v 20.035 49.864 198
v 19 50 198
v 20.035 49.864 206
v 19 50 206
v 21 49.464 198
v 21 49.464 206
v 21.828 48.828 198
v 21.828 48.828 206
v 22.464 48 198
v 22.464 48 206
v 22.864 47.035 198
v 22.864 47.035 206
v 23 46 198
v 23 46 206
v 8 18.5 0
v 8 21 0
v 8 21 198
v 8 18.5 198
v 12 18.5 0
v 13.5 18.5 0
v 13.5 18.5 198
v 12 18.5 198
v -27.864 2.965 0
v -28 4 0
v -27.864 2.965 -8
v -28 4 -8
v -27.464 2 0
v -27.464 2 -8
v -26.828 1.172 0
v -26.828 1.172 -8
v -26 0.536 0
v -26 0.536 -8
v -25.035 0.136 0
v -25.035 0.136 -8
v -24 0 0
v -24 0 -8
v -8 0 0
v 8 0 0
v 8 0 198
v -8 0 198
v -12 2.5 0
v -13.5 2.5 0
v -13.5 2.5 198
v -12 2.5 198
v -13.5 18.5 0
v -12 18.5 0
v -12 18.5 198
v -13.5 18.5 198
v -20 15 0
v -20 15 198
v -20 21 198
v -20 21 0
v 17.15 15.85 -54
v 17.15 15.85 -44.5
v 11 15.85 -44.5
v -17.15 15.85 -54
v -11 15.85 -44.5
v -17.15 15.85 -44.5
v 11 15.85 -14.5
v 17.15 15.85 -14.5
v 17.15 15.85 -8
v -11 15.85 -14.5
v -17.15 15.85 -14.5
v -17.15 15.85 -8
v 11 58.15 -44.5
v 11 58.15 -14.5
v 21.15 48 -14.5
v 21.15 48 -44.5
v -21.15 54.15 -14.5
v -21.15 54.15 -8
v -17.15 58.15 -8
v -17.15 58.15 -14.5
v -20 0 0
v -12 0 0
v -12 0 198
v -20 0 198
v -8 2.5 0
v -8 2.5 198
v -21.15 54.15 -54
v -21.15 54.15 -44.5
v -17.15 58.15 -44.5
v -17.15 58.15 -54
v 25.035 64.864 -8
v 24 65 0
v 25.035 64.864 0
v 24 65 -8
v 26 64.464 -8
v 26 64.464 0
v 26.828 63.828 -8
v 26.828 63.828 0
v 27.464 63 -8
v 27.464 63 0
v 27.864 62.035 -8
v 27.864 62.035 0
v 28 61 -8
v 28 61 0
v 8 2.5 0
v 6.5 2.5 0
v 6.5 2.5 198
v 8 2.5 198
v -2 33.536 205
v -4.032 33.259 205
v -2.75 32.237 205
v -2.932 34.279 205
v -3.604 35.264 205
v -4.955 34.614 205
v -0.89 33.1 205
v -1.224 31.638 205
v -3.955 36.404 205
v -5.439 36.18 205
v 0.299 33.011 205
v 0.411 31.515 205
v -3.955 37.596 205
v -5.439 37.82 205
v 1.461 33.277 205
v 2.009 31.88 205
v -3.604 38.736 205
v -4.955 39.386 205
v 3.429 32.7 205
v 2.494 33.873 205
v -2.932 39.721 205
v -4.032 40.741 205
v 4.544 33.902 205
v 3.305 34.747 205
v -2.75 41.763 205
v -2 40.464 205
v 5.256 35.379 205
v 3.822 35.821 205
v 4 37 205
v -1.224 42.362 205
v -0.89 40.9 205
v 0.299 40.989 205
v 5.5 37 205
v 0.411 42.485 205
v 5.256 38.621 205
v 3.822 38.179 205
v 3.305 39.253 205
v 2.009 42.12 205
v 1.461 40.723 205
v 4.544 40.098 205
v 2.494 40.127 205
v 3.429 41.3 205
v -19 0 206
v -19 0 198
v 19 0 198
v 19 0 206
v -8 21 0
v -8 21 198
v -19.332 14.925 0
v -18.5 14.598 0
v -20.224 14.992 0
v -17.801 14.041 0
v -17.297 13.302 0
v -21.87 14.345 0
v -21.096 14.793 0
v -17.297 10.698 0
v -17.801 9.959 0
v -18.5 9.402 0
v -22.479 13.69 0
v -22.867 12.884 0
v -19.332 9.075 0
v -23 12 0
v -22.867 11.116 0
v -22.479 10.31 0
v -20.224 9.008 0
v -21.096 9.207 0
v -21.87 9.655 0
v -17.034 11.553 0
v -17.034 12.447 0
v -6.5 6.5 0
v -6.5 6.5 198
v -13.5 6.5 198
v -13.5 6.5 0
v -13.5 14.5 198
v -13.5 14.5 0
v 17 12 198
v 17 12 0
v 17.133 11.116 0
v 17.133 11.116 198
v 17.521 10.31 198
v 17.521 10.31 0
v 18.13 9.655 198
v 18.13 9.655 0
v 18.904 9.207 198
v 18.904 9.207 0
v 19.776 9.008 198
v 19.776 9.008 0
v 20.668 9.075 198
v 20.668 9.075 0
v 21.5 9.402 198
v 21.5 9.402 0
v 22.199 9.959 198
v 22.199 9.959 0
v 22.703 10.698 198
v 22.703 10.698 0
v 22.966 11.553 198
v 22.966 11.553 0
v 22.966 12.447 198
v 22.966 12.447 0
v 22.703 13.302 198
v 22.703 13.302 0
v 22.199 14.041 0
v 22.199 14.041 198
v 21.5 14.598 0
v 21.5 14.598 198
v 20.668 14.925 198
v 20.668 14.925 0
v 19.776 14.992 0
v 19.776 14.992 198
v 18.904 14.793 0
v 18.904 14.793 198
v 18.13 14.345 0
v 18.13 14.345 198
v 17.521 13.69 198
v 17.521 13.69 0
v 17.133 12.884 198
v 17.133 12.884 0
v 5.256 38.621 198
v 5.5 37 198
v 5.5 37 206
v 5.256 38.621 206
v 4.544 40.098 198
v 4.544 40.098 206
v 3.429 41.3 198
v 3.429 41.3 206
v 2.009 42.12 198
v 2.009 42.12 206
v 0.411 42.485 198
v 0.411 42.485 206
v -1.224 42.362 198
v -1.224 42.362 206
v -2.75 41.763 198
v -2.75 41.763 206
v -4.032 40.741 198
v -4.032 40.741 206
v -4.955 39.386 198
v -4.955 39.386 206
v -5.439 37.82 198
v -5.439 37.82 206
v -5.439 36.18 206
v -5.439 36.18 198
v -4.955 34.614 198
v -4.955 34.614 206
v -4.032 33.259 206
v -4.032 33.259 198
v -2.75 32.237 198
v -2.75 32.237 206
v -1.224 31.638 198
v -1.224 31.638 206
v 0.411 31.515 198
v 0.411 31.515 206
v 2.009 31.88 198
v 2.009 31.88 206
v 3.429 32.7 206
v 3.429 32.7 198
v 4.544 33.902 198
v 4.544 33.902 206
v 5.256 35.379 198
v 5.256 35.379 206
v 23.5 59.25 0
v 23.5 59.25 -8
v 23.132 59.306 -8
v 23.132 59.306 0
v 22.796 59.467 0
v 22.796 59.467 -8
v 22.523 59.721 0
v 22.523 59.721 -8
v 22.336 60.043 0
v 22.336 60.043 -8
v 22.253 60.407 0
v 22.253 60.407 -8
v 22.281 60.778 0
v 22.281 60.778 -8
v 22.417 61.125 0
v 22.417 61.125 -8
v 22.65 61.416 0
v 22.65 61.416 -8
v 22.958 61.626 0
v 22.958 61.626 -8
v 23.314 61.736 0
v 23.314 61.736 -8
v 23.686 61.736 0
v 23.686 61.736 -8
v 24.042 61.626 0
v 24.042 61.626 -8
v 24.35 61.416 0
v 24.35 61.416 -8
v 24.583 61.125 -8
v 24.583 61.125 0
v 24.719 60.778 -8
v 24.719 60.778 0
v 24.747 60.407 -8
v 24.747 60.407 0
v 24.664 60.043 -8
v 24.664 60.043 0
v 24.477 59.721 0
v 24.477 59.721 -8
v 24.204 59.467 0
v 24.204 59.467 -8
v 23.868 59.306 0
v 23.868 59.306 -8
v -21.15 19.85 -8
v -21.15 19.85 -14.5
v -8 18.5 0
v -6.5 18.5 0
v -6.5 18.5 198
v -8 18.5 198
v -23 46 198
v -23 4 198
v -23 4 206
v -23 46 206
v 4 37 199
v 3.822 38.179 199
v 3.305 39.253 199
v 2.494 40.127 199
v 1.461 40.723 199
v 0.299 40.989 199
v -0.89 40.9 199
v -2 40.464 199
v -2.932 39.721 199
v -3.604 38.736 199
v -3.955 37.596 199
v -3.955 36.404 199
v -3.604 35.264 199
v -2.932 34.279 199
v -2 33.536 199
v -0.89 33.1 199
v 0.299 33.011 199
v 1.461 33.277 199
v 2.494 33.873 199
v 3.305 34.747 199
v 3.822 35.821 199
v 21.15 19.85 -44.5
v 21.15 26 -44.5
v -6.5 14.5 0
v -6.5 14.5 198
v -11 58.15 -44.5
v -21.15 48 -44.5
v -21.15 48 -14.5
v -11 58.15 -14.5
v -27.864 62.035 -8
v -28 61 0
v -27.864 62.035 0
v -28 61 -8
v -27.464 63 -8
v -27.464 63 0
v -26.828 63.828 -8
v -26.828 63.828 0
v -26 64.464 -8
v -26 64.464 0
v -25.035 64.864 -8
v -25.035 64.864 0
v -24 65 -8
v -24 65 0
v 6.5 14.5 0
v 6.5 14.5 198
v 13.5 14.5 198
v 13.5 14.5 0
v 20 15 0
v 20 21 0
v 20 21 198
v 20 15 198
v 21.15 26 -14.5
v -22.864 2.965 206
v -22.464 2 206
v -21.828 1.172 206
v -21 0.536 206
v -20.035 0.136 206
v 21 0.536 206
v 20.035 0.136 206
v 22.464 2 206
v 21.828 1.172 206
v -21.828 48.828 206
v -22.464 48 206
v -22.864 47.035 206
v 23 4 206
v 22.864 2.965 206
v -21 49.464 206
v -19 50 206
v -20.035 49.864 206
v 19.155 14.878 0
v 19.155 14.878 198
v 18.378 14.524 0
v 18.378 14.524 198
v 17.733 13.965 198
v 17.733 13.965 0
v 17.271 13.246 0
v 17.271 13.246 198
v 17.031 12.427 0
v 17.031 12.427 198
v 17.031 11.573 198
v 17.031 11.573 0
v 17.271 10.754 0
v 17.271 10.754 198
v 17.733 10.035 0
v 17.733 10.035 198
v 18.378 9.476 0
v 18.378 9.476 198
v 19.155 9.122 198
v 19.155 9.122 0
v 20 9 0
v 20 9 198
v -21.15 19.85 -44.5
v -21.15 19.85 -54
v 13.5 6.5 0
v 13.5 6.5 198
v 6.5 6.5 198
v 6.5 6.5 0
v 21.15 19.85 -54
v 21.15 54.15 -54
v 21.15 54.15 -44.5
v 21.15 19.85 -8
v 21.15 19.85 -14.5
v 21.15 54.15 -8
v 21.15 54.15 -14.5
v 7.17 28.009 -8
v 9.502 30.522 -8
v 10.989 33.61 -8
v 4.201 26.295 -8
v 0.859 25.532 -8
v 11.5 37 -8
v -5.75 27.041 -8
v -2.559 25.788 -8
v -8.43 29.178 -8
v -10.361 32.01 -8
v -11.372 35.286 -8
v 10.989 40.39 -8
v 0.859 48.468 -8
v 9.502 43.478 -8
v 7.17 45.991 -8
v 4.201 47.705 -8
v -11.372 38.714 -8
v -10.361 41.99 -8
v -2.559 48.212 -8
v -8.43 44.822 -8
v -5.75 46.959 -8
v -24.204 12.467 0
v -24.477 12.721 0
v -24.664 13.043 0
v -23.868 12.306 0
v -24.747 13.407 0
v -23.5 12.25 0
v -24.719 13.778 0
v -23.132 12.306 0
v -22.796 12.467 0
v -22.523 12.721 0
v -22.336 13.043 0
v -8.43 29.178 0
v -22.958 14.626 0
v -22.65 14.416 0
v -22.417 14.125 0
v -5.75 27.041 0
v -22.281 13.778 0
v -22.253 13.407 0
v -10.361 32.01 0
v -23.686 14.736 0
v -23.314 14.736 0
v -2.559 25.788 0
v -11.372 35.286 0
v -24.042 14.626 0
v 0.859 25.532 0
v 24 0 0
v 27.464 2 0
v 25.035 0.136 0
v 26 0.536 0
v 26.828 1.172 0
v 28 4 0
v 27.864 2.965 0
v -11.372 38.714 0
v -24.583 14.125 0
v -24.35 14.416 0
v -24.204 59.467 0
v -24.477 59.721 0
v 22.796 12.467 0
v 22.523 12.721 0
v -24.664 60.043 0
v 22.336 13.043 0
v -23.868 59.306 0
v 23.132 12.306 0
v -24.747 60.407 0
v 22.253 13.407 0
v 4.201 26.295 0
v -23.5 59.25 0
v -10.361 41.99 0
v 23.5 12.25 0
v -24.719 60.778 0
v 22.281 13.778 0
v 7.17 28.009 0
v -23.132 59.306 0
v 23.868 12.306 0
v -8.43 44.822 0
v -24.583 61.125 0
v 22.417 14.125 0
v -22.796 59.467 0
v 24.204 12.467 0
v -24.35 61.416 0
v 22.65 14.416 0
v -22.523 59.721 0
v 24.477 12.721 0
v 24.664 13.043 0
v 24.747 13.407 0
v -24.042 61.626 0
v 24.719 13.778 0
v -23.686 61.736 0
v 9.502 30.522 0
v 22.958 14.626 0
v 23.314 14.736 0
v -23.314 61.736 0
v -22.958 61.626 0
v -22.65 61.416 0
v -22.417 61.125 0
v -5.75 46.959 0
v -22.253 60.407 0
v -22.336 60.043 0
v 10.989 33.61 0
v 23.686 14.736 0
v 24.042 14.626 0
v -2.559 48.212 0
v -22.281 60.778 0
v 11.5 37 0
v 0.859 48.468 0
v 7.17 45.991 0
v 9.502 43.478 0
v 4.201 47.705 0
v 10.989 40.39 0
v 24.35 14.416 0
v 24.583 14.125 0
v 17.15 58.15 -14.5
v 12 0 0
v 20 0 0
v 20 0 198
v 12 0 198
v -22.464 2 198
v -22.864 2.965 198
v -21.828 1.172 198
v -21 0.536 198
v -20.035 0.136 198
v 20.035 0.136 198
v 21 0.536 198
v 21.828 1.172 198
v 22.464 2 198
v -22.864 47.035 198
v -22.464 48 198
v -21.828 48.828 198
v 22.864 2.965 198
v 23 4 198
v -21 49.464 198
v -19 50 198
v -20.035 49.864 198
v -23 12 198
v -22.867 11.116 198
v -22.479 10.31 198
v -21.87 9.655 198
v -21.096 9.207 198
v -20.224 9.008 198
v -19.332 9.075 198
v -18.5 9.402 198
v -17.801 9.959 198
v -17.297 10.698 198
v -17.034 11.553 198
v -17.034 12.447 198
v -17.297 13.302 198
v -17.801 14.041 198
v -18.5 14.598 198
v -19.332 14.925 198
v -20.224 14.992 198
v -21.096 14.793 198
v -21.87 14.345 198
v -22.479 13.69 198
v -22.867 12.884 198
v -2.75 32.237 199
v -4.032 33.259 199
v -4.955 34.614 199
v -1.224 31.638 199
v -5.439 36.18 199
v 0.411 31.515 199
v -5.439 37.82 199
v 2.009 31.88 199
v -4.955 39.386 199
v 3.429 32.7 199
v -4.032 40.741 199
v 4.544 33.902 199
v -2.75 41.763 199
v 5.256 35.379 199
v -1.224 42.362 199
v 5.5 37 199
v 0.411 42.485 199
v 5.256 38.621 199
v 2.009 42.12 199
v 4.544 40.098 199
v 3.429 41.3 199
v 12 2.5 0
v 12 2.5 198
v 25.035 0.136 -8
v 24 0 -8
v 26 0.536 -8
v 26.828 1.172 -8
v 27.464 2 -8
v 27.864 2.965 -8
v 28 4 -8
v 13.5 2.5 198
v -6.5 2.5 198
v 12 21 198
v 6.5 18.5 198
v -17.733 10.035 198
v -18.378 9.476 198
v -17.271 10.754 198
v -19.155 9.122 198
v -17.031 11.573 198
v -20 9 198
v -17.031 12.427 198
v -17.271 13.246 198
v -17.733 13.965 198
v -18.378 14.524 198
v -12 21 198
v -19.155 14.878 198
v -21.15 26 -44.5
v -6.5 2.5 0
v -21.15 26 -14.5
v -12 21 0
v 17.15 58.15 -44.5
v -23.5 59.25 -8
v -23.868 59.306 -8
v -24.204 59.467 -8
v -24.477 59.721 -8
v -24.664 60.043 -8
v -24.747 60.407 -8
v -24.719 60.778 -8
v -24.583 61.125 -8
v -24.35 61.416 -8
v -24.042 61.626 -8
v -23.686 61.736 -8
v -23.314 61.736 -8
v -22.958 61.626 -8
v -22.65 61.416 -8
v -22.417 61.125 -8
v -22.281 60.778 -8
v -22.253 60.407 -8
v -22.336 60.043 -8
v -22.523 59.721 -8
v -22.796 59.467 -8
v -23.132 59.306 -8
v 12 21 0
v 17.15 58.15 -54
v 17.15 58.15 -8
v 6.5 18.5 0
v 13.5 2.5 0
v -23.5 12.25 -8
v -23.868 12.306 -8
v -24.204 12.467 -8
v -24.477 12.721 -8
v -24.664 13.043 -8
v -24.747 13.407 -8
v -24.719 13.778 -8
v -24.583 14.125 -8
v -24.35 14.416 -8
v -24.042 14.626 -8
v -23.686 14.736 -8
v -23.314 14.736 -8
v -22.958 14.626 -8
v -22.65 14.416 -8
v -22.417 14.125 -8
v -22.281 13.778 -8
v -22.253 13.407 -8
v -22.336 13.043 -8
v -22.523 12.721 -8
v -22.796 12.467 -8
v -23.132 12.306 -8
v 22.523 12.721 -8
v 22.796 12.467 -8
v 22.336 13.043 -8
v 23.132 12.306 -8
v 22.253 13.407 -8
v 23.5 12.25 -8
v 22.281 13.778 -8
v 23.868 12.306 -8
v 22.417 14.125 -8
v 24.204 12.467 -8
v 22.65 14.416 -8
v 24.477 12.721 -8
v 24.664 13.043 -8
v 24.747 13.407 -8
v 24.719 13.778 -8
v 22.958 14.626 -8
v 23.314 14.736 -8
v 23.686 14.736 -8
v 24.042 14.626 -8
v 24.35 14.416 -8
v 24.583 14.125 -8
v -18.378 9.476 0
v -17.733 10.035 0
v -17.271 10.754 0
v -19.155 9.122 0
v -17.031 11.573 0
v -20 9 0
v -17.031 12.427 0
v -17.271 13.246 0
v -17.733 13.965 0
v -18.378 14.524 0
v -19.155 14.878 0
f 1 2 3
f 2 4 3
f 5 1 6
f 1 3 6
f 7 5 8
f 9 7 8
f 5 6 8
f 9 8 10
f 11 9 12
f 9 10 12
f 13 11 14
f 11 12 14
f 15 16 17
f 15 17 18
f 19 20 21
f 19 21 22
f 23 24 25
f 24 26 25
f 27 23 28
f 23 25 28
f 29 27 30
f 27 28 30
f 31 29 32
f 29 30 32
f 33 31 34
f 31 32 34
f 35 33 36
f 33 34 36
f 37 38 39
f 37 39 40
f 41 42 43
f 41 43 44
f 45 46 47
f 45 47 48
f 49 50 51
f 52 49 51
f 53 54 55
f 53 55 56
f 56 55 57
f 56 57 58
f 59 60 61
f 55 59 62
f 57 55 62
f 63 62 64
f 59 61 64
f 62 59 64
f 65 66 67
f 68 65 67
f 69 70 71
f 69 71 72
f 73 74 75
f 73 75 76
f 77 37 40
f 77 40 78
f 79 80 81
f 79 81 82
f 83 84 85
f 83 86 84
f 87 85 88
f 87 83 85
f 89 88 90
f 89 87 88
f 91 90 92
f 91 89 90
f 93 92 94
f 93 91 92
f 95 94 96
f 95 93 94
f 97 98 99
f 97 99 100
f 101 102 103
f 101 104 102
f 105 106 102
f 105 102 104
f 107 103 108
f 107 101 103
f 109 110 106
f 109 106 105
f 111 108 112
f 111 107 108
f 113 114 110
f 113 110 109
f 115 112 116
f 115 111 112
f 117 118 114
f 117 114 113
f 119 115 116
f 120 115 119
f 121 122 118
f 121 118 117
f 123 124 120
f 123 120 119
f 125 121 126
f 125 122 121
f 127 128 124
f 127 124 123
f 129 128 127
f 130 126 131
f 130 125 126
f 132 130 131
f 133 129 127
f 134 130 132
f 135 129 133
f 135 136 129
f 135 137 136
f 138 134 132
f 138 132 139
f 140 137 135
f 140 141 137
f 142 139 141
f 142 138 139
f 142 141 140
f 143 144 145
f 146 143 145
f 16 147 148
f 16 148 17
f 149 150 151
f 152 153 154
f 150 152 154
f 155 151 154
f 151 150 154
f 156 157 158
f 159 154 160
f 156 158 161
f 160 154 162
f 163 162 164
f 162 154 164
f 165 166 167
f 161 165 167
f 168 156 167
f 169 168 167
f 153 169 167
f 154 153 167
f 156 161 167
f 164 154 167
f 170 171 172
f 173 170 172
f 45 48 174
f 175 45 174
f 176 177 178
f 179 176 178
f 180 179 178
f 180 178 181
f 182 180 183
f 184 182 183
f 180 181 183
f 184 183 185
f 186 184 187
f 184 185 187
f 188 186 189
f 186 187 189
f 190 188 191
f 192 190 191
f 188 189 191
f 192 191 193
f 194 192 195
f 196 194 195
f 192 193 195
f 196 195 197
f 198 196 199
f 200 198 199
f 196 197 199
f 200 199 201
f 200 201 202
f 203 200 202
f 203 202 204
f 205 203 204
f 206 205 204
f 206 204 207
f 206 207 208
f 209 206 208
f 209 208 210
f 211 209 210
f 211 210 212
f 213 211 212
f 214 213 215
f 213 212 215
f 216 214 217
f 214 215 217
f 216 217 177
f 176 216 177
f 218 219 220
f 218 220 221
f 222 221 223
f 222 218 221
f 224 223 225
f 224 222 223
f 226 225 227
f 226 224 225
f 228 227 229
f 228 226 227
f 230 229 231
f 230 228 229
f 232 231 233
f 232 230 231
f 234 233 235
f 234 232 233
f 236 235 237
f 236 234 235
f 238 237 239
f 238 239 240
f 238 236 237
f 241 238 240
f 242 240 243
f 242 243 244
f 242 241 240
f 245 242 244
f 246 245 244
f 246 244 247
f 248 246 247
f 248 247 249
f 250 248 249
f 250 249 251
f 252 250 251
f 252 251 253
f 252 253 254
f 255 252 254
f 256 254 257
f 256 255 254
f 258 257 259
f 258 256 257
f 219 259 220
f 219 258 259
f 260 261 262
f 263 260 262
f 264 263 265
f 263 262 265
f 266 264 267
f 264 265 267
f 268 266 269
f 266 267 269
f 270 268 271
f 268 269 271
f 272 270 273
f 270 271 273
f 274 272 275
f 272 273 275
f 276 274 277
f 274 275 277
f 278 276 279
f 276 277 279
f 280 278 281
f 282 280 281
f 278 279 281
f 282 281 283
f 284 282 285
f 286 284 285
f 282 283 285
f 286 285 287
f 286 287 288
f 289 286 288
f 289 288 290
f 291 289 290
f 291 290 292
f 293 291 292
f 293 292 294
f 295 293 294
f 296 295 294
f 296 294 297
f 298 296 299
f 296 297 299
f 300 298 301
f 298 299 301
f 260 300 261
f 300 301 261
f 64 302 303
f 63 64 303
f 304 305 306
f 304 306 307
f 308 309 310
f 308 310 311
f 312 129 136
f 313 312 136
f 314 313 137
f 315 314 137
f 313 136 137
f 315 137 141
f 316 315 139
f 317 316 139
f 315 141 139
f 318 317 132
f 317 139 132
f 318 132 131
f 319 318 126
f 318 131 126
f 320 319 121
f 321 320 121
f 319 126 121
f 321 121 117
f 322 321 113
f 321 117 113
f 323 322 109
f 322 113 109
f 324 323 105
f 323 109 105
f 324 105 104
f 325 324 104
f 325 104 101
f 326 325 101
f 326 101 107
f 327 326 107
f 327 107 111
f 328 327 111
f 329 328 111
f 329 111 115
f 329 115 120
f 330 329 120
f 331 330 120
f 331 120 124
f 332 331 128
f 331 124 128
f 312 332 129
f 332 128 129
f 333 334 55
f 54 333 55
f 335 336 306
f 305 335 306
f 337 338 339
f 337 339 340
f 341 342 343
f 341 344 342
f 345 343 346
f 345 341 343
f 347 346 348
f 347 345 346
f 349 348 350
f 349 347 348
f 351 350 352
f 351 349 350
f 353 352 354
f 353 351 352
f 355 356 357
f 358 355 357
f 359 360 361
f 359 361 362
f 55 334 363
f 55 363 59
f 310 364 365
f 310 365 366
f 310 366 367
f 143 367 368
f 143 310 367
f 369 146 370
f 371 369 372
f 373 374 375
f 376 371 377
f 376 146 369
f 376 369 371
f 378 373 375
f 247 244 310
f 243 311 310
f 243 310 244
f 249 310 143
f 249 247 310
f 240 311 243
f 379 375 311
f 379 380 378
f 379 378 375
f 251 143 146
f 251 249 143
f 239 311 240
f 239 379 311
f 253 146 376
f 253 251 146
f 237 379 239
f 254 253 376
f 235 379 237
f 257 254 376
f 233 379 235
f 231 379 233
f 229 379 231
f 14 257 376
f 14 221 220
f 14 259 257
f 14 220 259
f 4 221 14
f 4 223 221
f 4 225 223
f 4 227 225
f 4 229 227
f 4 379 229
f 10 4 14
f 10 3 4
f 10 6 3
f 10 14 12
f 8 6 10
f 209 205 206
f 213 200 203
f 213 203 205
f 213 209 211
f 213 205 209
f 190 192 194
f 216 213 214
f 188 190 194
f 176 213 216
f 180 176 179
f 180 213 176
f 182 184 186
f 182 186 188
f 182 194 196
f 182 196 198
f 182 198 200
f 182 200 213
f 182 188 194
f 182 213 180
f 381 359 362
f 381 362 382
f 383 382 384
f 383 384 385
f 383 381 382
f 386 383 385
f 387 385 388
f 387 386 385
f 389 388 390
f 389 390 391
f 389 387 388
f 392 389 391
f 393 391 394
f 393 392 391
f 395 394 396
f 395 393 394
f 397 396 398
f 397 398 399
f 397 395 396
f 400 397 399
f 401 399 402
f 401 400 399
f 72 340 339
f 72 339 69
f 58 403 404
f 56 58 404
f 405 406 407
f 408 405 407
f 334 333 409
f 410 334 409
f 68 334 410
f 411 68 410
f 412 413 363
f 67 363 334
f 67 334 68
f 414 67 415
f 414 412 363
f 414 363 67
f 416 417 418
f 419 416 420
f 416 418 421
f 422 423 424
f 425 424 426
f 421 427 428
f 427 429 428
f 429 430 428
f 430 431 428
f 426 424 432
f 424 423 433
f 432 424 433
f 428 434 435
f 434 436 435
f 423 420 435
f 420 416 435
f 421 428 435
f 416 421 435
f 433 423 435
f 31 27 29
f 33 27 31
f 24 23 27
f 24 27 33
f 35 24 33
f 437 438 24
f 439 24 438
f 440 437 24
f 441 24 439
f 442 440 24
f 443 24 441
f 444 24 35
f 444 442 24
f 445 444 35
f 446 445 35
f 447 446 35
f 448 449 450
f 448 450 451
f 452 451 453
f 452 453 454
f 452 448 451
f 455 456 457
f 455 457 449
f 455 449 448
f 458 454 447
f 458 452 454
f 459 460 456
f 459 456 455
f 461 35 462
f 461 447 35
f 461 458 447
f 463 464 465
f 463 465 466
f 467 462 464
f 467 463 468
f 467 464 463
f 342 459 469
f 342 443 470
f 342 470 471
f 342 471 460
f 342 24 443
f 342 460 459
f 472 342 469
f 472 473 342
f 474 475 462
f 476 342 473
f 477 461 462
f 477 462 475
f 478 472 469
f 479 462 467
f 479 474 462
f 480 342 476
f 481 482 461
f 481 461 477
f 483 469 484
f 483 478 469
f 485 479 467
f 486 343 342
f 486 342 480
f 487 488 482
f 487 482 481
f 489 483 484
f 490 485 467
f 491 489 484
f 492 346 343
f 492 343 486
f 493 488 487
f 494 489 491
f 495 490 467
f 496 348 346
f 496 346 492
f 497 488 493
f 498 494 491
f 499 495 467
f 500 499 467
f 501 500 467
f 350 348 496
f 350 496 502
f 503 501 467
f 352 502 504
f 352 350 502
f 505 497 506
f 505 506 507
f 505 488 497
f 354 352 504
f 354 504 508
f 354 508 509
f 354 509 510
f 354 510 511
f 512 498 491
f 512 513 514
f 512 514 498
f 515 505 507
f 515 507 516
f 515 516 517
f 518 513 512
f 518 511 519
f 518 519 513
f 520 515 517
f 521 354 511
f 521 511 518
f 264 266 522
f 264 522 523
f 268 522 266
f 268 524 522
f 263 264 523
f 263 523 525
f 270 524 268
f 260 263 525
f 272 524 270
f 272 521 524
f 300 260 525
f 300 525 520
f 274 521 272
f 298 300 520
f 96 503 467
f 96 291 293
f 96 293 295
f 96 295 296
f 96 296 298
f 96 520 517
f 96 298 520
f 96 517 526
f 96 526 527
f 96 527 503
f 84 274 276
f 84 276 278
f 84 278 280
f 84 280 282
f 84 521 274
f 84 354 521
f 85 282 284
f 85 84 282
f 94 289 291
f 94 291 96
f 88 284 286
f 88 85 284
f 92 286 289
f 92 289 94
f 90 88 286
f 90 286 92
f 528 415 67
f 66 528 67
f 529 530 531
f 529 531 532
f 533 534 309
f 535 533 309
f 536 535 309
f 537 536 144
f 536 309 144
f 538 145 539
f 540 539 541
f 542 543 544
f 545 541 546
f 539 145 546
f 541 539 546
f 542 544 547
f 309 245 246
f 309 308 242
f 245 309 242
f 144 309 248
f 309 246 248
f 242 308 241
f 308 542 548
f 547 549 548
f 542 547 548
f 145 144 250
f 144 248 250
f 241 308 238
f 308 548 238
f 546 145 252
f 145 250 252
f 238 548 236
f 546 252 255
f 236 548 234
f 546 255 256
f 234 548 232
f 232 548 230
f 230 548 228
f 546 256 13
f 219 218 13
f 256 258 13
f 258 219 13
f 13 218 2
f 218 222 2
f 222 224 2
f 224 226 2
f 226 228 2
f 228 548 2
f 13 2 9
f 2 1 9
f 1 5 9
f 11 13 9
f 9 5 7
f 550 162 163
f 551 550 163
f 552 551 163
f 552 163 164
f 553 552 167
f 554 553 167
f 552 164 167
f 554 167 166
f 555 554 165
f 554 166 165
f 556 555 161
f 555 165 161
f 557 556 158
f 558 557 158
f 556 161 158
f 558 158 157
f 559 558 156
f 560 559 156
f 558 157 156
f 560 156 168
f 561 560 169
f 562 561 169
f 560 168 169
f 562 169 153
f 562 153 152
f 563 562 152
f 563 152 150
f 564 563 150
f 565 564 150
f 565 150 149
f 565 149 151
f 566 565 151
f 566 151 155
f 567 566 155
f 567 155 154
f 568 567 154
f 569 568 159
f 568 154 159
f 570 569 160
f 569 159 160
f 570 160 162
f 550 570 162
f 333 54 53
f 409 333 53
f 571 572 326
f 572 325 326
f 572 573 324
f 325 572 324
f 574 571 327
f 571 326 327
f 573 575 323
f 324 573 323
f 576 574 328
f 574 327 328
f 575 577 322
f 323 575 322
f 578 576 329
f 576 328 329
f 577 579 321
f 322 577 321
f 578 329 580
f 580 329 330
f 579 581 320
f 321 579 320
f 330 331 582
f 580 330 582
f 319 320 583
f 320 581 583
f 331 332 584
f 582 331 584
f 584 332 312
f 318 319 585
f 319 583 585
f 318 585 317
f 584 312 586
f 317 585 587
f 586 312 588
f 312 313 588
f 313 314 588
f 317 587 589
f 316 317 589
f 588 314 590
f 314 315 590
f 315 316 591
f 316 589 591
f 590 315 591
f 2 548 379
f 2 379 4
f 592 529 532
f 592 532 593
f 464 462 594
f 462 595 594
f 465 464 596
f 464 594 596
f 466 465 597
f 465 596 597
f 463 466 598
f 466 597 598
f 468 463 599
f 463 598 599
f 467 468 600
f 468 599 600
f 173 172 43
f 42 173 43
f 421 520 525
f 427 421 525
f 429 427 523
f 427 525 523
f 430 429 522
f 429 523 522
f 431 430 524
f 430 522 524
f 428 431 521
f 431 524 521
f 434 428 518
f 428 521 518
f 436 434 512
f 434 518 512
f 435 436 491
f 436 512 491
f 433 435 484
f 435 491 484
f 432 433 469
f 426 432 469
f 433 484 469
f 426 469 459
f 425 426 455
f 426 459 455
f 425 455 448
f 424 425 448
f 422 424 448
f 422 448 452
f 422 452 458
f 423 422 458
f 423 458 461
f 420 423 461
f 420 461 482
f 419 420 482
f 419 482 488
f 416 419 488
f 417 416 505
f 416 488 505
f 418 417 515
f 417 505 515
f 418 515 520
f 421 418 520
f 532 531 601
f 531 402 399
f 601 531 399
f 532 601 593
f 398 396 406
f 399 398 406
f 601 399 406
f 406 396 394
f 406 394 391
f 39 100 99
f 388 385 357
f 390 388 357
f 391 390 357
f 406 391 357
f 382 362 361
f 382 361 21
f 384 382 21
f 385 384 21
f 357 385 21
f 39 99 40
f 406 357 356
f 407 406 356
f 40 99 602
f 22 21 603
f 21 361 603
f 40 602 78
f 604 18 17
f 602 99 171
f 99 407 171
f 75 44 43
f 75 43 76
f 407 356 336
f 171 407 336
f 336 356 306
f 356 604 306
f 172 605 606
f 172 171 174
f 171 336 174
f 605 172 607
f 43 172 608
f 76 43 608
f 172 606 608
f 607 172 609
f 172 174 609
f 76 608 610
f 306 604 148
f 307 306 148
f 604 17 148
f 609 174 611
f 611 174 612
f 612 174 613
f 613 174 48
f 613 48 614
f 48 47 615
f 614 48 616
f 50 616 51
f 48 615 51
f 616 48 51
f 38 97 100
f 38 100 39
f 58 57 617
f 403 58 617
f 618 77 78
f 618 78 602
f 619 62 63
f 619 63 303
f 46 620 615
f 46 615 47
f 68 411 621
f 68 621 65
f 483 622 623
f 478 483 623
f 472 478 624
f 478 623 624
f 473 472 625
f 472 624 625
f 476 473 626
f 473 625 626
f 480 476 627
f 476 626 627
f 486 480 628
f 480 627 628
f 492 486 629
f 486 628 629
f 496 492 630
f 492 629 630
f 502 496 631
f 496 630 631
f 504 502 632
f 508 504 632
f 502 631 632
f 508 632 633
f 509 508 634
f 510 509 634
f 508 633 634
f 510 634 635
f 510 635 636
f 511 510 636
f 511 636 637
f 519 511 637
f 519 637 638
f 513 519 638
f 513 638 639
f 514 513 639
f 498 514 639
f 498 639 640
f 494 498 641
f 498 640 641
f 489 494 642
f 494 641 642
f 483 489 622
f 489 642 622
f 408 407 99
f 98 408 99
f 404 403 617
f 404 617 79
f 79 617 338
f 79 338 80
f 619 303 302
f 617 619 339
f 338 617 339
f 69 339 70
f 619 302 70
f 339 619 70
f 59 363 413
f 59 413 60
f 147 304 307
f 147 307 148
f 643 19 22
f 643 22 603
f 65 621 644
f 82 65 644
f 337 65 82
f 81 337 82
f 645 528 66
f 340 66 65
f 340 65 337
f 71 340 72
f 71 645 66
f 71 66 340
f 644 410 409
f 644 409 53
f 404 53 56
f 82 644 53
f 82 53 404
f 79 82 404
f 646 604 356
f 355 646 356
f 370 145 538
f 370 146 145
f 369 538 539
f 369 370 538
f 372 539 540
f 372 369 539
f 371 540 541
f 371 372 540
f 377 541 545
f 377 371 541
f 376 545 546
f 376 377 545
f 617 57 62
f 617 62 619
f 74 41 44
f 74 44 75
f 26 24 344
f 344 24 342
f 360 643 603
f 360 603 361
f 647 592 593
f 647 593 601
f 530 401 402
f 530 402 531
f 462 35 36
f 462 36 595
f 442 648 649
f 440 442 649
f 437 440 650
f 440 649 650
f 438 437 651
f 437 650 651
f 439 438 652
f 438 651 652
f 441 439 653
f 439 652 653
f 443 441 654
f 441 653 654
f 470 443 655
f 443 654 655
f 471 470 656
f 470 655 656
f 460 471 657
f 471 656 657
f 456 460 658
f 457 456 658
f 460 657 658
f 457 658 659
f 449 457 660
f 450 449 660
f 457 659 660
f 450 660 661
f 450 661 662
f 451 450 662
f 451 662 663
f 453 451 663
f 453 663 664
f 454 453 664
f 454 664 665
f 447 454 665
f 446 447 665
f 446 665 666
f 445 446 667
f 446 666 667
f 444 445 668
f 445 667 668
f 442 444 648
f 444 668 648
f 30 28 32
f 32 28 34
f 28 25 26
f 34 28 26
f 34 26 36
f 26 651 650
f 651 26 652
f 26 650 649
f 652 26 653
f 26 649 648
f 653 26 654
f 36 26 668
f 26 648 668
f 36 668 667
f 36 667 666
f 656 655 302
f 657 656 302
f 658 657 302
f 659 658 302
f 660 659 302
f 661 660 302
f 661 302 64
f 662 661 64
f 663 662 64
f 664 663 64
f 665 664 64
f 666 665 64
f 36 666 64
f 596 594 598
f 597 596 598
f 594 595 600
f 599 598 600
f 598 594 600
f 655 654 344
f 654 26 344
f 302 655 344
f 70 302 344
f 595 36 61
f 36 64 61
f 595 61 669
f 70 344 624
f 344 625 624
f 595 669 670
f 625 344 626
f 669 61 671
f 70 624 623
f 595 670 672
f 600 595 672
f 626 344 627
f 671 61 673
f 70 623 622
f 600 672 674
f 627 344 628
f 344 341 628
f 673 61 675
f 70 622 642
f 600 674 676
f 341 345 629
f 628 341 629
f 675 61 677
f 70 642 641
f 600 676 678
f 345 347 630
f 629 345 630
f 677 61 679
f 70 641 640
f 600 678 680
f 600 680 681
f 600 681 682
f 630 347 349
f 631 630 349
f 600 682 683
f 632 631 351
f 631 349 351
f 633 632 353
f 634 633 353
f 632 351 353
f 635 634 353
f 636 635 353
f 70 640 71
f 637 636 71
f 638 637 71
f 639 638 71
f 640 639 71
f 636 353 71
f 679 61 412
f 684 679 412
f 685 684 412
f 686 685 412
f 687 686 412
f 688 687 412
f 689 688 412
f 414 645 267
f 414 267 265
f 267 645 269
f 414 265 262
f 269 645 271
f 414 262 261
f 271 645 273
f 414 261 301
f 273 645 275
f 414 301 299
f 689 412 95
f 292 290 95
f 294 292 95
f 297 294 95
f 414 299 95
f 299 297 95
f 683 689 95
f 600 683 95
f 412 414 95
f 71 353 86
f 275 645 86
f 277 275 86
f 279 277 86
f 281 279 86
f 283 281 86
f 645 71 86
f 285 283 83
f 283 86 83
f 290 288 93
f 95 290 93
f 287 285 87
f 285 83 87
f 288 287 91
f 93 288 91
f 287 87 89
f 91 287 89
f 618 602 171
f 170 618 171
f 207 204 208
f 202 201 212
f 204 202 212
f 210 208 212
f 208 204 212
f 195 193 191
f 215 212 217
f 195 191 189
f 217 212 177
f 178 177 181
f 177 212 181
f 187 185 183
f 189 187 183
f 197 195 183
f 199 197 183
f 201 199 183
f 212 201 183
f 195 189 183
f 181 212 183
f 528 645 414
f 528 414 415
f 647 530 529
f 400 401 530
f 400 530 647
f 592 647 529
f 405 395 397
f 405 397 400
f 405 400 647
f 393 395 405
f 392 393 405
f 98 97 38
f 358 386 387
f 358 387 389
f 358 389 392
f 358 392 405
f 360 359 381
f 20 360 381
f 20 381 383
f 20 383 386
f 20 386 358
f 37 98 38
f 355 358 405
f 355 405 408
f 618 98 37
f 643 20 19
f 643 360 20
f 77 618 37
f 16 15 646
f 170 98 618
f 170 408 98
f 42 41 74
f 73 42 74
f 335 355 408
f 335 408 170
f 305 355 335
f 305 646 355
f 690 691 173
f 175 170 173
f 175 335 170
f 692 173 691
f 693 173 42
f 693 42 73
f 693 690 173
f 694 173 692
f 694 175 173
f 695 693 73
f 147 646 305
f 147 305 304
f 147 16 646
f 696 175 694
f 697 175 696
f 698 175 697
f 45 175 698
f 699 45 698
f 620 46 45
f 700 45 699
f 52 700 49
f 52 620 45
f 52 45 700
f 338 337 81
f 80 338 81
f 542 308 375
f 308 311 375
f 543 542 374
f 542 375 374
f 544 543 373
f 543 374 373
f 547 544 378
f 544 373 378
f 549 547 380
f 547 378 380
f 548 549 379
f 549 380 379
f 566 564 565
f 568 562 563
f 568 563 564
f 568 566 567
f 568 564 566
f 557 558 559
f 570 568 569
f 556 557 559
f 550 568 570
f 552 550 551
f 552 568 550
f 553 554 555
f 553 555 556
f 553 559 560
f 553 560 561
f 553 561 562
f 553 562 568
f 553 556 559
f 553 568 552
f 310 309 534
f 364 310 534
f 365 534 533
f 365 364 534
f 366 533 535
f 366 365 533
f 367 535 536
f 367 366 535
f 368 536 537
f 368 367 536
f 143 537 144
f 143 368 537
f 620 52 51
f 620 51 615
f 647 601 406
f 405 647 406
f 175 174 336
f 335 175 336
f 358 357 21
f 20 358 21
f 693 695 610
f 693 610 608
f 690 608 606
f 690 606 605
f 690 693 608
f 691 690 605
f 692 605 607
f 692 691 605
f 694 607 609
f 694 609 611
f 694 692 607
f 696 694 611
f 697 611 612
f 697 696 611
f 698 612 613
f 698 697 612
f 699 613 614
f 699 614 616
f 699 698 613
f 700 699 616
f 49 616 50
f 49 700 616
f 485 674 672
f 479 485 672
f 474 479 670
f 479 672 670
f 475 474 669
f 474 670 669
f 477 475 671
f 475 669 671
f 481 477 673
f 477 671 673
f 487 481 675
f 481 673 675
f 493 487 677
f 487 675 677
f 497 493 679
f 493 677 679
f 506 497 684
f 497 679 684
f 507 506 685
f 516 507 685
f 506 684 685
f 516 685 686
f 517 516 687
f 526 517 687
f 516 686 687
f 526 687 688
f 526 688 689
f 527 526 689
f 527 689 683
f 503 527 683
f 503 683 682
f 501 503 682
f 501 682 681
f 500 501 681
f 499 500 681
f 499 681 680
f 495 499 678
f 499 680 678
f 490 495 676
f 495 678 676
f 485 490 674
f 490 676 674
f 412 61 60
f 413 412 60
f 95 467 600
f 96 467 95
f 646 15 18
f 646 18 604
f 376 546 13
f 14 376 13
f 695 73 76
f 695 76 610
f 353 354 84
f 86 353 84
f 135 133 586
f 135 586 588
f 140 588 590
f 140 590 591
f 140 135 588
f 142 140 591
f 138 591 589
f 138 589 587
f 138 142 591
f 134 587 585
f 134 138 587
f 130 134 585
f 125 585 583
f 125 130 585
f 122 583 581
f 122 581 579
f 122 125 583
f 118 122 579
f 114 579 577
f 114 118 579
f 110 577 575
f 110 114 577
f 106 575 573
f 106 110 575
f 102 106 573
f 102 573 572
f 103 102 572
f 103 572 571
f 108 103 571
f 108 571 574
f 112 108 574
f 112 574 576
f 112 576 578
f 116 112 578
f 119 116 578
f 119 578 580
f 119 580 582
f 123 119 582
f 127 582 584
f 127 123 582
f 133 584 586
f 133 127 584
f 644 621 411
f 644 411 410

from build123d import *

# Parameters (mm, degrees)
SKETCH2_W                            = 56
SKETCH2_H                            = 65
SKETCH2_R                            = 11.5
BOSS_EXTRUDE2_DEPTH                  = 8
BOSS_EXTRUDE1_DEPTH                  = 198
SKETCH3_W                            = 46
SKETCH3_H                            = 50
SKETCH3_R                            = 5.5
BOSS_EXTRUDE3_DEPTH                  = 8
SKETCH4_R                            = 5.5
SKETCH4_R_2                          = 4
BOSS_EXTRUDE4_DEPTH                  = 6
FILLET1_R                            = 4
FILLET2_R                            = 4
SKETCH5_R                            = 3
BOSS_EXTRUDE5_DEPTH                  = 198
BOSS_EXTRUDE5_2_DEPTH                = 198
SKETCH6_W                            = 42.3
SKETCH6_H                            = 42.3
BOSS_EXTRUDE6_DEPTH                  = 6.5
BOSS_EXTRUDE7_DEPTH                  = 30
SKETCH8_W                            = 42.3
SKETCH8_H                            = 42.3
BOSS_EXTRUDE8_DEPTH                  = 9.5
CHAMFER1_SIZE                        = 4
SKETCH11_W                           = 1.25
SKETCH11_H                           = 54
TAP_DRILL_FOR_M3X0_5_TAP1_AT_2_COUNT = 2
TAP_DRILL_FOR_M3X0_5_TAP1_AT_2_PITCH = 47
TAP_DRILL_FOR_M3X0_5_TAP1_AT_3_COUNT = 2
TAP_DRILL_FOR_M3X0_5_TAP1_AT_3_PITCH = 66.468037432
TAP_DRILL_FOR_M3X0_5_TAP1_AT_4_COUNT = 2
TAP_DRILL_FOR_M3X0_5_TAP1_AT_4_PITCH = 47


with BuildPart() as part:
    # Sketch2 → Boss-Extrude2 (new body)
    with BuildSketch(Plane.XY):
        with Locations((0, 32.5)):
            Rectangle(SKETCH2_W, SKETCH2_H)
        with Locations((0, 37)):
            Circle(SKETCH2_R, mode=Mode.SUBTRACT)
    extrude(amount=-BOSS_EXTRUDE2_DEPTH)

    # Fillet1
    fillet1_edges = [part.edges().sort_by_distance(p)[0] for p in [
        (-28, 65, -4),
        (28, 65, -4),
        (28, 0, -4),
        (-28, 0, -4),
    ]]
    fillet(fillet1_edges, radius=FILLET1_R)

    # Sketch6 → Boss-Extrude6 (add)
    with BuildSketch(Plane(origin=(0, 0, -8), x_dir=(-1, 0, 0), z_dir=(0, 0, -1))):
        with Locations((0, 37)):
            Rectangle(SKETCH6_W, SKETCH6_H)
    extrude(amount=BOSS_EXTRUDE6_DEPTH)

    # Sketch7 → Boss-Extrude7 (add)
    with BuildSketch(Plane(origin=(0, 0, -14.5), x_dir=(-1, 0, 0), z_dir=(0, 0, -1))):
        Polygon((-11, 58.15), (-21.15, 48), (-21.15, 26), (-11, 15.85), (11, 15.85), (21.15, 26), (21.15, 48), (11, 58.15), align=None)
    extrude(amount=BOSS_EXTRUDE7_DEPTH)

    # Sketch8 → Boss-Extrude8 (add)
    with BuildSketch(Plane(origin=(0, 0, -44.5), x_dir=(-1, 0, 0), z_dir=(0, 0, -1))):
        with Locations((0, 37)):
            Rectangle(SKETCH8_W, SKETCH8_H)
    extrude(amount=BOSS_EXTRUDE8_DEPTH)

    # Chamfer1
    chamfer1_edges = [part.edges().sort_by_distance(p)[0] for p in [
        (-21.15, 15.85, -11.25),
        (-21.15, 58.15, -11.25),
        (21.15, 58.15, -11.25),
        (21.15, 15.85, -11.25),
        (21.15, 58.15, -49.25),
        (21.15, 15.85, -49.25),
        (-21.15, 15.85, -49.25),
        (-21.15, 58.15, -49.25),
    ]]
    chamfer(chamfer1_edges, length=CHAMFER1_SIZE)

    # Sketch11 → Tap Drill for M3x0.5 Tap1 (revolve, cut)
    with BuildSketch(Plane(origin=(23.5, 60.5, 0), x_dir=(0, -1, 0), z_dir=(1, 0, 0))):
        with Locations((0.625, 27)):
            Rectangle(SKETCH11_W, SKETCH11_H)
    tap_drill_for_m3x0_5_tap1 = revolve(axis=Axis((23.5, 60.5, 6.35), (0, 0, -1)), mode=Mode.SUBTRACT)

    # Tap Drill for M3x0.5 Tap1 at 2: Tap Drill for M3x0.5 Tap1 ×2
    with Locations(*[(-i * TAP_DRILL_FOR_M3X0_5_TAP1_AT_2_PITCH, 0, 0) for i in range(1, TAP_DRILL_FOR_M3X0_5_TAP1_AT_2_COUNT)]):
        add(tap_drill_for_m3x0_5_tap1, mode=Mode.SUBTRACT)

    # Tap Drill for M3x0.5 Tap1 at 3: Tap Drill for M3x0.5 Tap1 ×2
    with Locations(*[Vector(-0.7071067811865475, -0.7071067811865477, 0) * (i * TAP_DRILL_FOR_M3X0_5_TAP1_AT_3_PITCH) for i in range(1, TAP_DRILL_FOR_M3X0_5_TAP1_AT_3_COUNT)]):
        add(tap_drill_for_m3x0_5_tap1, mode=Mode.SUBTRACT)

    # Tap Drill for M3x0.5 Tap1 at 4: Tap Drill for M3x0.5 Tap1 ×2
    with Locations(*[(0, -i * TAP_DRILL_FOR_M3X0_5_TAP1_AT_4_PITCH, 0) for i in range(1, TAP_DRILL_FOR_M3X0_5_TAP1_AT_4_COUNT)]):
        add(tap_drill_for_m3x0_5_tap1, mode=Mode.SUBTRACT)


with BuildPart() as body_2:
    # Sketch1 → Boss-Extrude1 (new body)
    with BuildSketch(Plane.XY):
        with BuildLine():
            Line((8, 0), (-8, 0))
            Line((-8, 0), (-8, 2.5))
            Line((-8, 2.5), (-6.5, 2.5))
            Line((-6.5, 2.5), (-6.5, 6.5))
            Line((-6.5, 6.5), (-13.5, 6.5))
            Line((-13.5, 6.5), (-13.5, 2.5))
            Line((-13.5, 2.5), (-12, 2.5))
            Line((-12, 2.5), (-12, 0))
            Line((-12, 0), (-20, 0))
            Line((-20, 0), (-20, 9))
            ThreePointArc((-20, 9), (-17, 12), (-20, 15))
            Line((-20, 15), (-20, 21))
            Line((-20, 21), (-12, 21))
            Line((-12, 21), (-12, 18.5))
            Line((-12, 18.5), (-13.5, 18.5))
            Line((-13.5, 18.5), (-13.5, 14.5))
            Line((-13.5, 14.5), (-6.5, 14.5))
            Line((-6.5, 14.5), (-6.5, 18.5))
            Line((-6.5, 18.5), (-8, 18.5))
            Line((-8, 18.5), (-8, 21))
            Line((-8, 21), (8, 21))
            Line((8, 21), (8, 18.5))
            Line((8, 18.5), (6.5, 18.5))
            Line((6.5, 18.5), (6.5, 14.5))
            Line((6.5, 14.5), (13.5, 14.5))
            Line((13.5, 14.5), (13.5, 18.5))
            Line((13.5, 18.5), (12, 18.5))
            Line((12, 18.5), (12, 21))
            Line((12, 21), (20, 21))
            Line((20, 21), (20, 15))
            ThreePointArc((20, 15), (17, 12), (20, 9))
            Line((20, 9), (20, 0))
            Line((20, 0), (12, 0))
            Line((12, 0), (12, 2.5))
            Line((12, 2.5), (13.5, 2.5))
            Line((13.5, 2.5), (13.5, 6.5))
            Line((13.5, 6.5), (6.5, 6.5))
            Line((6.5, 6.5), (6.5, 2.5))
            Line((6.5, 2.5), (8, 2.5))
            Line((8, 2.5), (8, 0))
        make_face()
    extrude(amount=BOSS_EXTRUDE1_DEPTH)


with BuildPart() as body_3:
    # Sketch3 → Boss-Extrude3 (new body)
    with BuildSketch(Plane.XY.offset(198)):
        with Locations((0, 25)):
            Rectangle(SKETCH3_W, SKETCH3_H)
        with Locations((0, 37)):
            Circle(SKETCH3_R, mode=Mode.SUBTRACT)
    extrude(amount=BOSS_EXTRUDE3_DEPTH)

    # Fillet2
    fillet2_edges = [body_3.edges().sort_by_distance(p)[0] for p in [
        (-23, 50, 202),
        (23, 50, 202),
        (23, 0, 202),
        (-23, 0, 202),
    ]]
    fillet(fillet2_edges, radius=FILLET2_R)


with BuildPart() as body_4:
    # Sketch4 → Boss-Extrude4 (new body)
    with BuildSketch(Plane.XY.offset(205)):
        with Locations((0, 37)):
            Circle(SKETCH4_R)
        with Locations((0, 37)):
            Circle(SKETCH4_R_2, mode=Mode.SUBTRACT)
    extrude(amount=-BOSS_EXTRUDE4_DEPTH)


with BuildPart() as body_5:
    # Sketch5 → Boss-Extrude5 (new body)
    with BuildSketch(Plane.XY):
        with Locations(Location((-20, 12, 0), (0, 0, 180))):
            Circle(SKETCH5_R)
    extrude(amount=BOSS_EXTRUDE5_DEPTH)


with BuildPart() as body_6:
    # Sketch5 → Boss-Extrude5 2 (new body)
    with BuildSketch(Plane.XY):
        with Locations(Location((20, 12, 0), (0, 0, 180))):
            Circle(SKETCH5_R)
    extrude(amount=BOSS_EXTRUDE5_2_DEPTH)


solid = Compound([part.part, body_2.part, body_3.part, body_4.part, body_5.part, body_6.part])
